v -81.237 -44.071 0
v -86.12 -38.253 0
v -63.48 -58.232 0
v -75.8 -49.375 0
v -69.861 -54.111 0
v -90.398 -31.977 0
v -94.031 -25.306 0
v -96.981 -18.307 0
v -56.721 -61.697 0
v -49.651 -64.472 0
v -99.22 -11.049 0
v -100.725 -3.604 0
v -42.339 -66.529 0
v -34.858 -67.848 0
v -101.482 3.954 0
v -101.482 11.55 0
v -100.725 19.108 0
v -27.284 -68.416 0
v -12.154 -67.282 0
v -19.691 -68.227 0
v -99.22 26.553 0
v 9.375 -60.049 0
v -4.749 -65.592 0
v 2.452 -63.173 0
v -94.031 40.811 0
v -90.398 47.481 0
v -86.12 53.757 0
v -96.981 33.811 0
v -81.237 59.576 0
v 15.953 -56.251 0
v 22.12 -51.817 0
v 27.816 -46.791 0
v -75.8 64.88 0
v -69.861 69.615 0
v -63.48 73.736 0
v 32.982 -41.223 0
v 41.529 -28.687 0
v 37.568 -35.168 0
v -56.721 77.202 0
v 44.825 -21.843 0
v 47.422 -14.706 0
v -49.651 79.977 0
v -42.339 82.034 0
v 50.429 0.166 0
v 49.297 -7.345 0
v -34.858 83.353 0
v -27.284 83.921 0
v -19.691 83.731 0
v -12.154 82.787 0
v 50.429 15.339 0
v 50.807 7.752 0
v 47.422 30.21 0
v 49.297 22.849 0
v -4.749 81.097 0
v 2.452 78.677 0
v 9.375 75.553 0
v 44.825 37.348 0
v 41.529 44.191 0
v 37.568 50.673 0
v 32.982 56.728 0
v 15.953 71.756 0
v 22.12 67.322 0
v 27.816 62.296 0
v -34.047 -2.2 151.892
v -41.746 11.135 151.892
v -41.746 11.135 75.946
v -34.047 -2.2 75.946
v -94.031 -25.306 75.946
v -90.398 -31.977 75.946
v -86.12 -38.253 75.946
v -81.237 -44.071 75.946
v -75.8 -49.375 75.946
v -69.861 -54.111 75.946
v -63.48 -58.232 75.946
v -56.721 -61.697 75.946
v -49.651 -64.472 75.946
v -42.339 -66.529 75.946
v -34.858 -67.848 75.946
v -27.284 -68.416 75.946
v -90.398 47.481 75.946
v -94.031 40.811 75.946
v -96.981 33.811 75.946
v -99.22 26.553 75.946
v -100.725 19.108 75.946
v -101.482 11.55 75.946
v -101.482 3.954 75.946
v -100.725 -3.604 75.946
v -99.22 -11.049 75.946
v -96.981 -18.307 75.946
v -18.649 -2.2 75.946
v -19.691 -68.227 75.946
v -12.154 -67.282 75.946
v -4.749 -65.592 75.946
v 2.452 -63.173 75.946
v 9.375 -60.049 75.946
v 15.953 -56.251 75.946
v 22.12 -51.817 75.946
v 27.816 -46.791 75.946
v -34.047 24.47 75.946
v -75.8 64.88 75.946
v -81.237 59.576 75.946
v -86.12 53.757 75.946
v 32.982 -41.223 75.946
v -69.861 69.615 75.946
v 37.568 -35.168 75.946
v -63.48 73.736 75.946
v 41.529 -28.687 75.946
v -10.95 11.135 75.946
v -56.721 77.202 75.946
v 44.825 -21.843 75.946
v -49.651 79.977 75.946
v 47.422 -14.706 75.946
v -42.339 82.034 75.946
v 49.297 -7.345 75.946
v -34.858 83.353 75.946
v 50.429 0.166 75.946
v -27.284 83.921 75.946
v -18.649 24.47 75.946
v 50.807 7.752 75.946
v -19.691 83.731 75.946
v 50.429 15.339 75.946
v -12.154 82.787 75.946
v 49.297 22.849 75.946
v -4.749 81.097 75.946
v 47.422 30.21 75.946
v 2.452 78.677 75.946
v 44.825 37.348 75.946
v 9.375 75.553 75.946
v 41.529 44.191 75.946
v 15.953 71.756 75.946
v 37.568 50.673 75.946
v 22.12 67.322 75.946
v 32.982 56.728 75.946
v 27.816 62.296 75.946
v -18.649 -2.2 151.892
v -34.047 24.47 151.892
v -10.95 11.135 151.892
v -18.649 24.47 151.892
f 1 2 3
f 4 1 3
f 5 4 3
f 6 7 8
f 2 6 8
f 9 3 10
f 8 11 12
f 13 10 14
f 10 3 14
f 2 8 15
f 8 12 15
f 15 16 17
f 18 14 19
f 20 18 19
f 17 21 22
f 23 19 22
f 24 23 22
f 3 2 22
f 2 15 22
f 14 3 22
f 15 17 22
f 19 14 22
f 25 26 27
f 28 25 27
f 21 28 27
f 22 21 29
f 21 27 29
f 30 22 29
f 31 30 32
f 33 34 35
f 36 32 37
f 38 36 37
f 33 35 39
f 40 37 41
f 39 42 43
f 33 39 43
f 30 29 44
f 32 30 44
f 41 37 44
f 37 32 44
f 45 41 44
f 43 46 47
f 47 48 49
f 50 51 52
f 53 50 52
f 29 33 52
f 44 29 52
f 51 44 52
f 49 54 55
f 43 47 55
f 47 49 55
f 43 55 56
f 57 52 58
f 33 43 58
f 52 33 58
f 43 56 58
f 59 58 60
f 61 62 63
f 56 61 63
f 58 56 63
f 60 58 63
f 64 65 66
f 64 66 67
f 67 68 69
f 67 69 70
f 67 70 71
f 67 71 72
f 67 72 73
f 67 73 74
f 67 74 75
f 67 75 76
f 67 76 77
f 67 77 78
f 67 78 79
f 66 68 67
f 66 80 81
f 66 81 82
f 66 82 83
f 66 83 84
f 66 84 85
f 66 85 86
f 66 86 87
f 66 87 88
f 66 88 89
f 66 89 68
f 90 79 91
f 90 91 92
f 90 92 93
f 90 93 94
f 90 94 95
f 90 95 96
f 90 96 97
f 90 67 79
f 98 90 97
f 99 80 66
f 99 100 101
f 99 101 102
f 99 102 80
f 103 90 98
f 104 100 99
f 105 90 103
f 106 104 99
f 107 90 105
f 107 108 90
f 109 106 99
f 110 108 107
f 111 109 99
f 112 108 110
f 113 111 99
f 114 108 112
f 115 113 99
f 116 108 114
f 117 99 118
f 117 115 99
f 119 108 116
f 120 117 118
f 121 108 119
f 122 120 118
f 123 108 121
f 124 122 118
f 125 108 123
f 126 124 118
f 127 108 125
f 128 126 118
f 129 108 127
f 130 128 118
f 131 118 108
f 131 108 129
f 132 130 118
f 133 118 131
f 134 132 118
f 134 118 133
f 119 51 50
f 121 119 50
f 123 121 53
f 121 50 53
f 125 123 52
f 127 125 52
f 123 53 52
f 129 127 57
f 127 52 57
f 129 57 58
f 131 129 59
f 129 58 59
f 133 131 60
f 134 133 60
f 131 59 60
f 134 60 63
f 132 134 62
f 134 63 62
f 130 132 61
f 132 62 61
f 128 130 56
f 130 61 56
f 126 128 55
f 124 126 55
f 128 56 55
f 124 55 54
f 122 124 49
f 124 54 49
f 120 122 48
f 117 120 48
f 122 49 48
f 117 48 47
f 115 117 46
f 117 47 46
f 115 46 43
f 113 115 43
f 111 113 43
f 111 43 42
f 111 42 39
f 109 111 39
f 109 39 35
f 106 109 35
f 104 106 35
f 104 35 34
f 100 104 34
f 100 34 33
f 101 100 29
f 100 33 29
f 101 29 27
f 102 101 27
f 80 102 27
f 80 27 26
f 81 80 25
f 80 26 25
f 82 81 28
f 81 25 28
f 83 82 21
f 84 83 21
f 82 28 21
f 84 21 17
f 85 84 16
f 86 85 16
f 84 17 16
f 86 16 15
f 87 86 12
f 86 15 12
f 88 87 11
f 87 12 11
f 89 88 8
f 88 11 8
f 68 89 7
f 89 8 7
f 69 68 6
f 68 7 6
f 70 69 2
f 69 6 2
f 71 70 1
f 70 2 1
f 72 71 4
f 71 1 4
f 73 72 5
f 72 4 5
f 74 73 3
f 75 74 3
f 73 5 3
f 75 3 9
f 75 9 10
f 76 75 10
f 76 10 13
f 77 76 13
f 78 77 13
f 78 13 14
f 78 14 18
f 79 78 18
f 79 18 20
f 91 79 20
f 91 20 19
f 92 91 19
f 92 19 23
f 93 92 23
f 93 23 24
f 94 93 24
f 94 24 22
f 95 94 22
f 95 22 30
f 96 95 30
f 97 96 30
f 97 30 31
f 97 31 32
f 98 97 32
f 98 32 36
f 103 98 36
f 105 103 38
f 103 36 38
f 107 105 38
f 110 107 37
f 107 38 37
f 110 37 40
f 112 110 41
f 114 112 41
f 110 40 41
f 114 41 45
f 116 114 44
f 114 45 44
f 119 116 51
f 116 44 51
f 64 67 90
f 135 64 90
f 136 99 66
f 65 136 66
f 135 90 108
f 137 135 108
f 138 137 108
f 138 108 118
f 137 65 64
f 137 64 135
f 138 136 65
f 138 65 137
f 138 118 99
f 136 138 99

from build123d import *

# Parameters (mm, degrees)
SKETCH1_R           = 76.191937258
BOSS_EXTRUDE1_DEPTH = 75.946
BOSS_EXTRUDE2_DEPTH = 75.946


with BuildPart() as part:
    # Sketch1 → Boss-Extrude1 (new body)
    with BuildSketch(Plane.XY):
        with Locations((-25.384457056, 7.752300794)):
            Circle(SKETCH1_R)
    extrude(amount=BOSS_EXTRUDE1_DEPTH)

    # Sketch2 → Boss-Extrude2 (add)
    with BuildSketch(Plane.XY.offset(75.946)):
        Polygon((-10.949916627, 11.135298471), (-18.648882466, 24.470298471), (-34.046814146, 24.470298471), (-41.745779985, 11.135298471), (-34.046814146, -2.199701529), (-18.648882466, -2.199701529), align=None)
    extrude(amount=BOSS_EXTRUDE2_DEPTH)


solid = part.part
